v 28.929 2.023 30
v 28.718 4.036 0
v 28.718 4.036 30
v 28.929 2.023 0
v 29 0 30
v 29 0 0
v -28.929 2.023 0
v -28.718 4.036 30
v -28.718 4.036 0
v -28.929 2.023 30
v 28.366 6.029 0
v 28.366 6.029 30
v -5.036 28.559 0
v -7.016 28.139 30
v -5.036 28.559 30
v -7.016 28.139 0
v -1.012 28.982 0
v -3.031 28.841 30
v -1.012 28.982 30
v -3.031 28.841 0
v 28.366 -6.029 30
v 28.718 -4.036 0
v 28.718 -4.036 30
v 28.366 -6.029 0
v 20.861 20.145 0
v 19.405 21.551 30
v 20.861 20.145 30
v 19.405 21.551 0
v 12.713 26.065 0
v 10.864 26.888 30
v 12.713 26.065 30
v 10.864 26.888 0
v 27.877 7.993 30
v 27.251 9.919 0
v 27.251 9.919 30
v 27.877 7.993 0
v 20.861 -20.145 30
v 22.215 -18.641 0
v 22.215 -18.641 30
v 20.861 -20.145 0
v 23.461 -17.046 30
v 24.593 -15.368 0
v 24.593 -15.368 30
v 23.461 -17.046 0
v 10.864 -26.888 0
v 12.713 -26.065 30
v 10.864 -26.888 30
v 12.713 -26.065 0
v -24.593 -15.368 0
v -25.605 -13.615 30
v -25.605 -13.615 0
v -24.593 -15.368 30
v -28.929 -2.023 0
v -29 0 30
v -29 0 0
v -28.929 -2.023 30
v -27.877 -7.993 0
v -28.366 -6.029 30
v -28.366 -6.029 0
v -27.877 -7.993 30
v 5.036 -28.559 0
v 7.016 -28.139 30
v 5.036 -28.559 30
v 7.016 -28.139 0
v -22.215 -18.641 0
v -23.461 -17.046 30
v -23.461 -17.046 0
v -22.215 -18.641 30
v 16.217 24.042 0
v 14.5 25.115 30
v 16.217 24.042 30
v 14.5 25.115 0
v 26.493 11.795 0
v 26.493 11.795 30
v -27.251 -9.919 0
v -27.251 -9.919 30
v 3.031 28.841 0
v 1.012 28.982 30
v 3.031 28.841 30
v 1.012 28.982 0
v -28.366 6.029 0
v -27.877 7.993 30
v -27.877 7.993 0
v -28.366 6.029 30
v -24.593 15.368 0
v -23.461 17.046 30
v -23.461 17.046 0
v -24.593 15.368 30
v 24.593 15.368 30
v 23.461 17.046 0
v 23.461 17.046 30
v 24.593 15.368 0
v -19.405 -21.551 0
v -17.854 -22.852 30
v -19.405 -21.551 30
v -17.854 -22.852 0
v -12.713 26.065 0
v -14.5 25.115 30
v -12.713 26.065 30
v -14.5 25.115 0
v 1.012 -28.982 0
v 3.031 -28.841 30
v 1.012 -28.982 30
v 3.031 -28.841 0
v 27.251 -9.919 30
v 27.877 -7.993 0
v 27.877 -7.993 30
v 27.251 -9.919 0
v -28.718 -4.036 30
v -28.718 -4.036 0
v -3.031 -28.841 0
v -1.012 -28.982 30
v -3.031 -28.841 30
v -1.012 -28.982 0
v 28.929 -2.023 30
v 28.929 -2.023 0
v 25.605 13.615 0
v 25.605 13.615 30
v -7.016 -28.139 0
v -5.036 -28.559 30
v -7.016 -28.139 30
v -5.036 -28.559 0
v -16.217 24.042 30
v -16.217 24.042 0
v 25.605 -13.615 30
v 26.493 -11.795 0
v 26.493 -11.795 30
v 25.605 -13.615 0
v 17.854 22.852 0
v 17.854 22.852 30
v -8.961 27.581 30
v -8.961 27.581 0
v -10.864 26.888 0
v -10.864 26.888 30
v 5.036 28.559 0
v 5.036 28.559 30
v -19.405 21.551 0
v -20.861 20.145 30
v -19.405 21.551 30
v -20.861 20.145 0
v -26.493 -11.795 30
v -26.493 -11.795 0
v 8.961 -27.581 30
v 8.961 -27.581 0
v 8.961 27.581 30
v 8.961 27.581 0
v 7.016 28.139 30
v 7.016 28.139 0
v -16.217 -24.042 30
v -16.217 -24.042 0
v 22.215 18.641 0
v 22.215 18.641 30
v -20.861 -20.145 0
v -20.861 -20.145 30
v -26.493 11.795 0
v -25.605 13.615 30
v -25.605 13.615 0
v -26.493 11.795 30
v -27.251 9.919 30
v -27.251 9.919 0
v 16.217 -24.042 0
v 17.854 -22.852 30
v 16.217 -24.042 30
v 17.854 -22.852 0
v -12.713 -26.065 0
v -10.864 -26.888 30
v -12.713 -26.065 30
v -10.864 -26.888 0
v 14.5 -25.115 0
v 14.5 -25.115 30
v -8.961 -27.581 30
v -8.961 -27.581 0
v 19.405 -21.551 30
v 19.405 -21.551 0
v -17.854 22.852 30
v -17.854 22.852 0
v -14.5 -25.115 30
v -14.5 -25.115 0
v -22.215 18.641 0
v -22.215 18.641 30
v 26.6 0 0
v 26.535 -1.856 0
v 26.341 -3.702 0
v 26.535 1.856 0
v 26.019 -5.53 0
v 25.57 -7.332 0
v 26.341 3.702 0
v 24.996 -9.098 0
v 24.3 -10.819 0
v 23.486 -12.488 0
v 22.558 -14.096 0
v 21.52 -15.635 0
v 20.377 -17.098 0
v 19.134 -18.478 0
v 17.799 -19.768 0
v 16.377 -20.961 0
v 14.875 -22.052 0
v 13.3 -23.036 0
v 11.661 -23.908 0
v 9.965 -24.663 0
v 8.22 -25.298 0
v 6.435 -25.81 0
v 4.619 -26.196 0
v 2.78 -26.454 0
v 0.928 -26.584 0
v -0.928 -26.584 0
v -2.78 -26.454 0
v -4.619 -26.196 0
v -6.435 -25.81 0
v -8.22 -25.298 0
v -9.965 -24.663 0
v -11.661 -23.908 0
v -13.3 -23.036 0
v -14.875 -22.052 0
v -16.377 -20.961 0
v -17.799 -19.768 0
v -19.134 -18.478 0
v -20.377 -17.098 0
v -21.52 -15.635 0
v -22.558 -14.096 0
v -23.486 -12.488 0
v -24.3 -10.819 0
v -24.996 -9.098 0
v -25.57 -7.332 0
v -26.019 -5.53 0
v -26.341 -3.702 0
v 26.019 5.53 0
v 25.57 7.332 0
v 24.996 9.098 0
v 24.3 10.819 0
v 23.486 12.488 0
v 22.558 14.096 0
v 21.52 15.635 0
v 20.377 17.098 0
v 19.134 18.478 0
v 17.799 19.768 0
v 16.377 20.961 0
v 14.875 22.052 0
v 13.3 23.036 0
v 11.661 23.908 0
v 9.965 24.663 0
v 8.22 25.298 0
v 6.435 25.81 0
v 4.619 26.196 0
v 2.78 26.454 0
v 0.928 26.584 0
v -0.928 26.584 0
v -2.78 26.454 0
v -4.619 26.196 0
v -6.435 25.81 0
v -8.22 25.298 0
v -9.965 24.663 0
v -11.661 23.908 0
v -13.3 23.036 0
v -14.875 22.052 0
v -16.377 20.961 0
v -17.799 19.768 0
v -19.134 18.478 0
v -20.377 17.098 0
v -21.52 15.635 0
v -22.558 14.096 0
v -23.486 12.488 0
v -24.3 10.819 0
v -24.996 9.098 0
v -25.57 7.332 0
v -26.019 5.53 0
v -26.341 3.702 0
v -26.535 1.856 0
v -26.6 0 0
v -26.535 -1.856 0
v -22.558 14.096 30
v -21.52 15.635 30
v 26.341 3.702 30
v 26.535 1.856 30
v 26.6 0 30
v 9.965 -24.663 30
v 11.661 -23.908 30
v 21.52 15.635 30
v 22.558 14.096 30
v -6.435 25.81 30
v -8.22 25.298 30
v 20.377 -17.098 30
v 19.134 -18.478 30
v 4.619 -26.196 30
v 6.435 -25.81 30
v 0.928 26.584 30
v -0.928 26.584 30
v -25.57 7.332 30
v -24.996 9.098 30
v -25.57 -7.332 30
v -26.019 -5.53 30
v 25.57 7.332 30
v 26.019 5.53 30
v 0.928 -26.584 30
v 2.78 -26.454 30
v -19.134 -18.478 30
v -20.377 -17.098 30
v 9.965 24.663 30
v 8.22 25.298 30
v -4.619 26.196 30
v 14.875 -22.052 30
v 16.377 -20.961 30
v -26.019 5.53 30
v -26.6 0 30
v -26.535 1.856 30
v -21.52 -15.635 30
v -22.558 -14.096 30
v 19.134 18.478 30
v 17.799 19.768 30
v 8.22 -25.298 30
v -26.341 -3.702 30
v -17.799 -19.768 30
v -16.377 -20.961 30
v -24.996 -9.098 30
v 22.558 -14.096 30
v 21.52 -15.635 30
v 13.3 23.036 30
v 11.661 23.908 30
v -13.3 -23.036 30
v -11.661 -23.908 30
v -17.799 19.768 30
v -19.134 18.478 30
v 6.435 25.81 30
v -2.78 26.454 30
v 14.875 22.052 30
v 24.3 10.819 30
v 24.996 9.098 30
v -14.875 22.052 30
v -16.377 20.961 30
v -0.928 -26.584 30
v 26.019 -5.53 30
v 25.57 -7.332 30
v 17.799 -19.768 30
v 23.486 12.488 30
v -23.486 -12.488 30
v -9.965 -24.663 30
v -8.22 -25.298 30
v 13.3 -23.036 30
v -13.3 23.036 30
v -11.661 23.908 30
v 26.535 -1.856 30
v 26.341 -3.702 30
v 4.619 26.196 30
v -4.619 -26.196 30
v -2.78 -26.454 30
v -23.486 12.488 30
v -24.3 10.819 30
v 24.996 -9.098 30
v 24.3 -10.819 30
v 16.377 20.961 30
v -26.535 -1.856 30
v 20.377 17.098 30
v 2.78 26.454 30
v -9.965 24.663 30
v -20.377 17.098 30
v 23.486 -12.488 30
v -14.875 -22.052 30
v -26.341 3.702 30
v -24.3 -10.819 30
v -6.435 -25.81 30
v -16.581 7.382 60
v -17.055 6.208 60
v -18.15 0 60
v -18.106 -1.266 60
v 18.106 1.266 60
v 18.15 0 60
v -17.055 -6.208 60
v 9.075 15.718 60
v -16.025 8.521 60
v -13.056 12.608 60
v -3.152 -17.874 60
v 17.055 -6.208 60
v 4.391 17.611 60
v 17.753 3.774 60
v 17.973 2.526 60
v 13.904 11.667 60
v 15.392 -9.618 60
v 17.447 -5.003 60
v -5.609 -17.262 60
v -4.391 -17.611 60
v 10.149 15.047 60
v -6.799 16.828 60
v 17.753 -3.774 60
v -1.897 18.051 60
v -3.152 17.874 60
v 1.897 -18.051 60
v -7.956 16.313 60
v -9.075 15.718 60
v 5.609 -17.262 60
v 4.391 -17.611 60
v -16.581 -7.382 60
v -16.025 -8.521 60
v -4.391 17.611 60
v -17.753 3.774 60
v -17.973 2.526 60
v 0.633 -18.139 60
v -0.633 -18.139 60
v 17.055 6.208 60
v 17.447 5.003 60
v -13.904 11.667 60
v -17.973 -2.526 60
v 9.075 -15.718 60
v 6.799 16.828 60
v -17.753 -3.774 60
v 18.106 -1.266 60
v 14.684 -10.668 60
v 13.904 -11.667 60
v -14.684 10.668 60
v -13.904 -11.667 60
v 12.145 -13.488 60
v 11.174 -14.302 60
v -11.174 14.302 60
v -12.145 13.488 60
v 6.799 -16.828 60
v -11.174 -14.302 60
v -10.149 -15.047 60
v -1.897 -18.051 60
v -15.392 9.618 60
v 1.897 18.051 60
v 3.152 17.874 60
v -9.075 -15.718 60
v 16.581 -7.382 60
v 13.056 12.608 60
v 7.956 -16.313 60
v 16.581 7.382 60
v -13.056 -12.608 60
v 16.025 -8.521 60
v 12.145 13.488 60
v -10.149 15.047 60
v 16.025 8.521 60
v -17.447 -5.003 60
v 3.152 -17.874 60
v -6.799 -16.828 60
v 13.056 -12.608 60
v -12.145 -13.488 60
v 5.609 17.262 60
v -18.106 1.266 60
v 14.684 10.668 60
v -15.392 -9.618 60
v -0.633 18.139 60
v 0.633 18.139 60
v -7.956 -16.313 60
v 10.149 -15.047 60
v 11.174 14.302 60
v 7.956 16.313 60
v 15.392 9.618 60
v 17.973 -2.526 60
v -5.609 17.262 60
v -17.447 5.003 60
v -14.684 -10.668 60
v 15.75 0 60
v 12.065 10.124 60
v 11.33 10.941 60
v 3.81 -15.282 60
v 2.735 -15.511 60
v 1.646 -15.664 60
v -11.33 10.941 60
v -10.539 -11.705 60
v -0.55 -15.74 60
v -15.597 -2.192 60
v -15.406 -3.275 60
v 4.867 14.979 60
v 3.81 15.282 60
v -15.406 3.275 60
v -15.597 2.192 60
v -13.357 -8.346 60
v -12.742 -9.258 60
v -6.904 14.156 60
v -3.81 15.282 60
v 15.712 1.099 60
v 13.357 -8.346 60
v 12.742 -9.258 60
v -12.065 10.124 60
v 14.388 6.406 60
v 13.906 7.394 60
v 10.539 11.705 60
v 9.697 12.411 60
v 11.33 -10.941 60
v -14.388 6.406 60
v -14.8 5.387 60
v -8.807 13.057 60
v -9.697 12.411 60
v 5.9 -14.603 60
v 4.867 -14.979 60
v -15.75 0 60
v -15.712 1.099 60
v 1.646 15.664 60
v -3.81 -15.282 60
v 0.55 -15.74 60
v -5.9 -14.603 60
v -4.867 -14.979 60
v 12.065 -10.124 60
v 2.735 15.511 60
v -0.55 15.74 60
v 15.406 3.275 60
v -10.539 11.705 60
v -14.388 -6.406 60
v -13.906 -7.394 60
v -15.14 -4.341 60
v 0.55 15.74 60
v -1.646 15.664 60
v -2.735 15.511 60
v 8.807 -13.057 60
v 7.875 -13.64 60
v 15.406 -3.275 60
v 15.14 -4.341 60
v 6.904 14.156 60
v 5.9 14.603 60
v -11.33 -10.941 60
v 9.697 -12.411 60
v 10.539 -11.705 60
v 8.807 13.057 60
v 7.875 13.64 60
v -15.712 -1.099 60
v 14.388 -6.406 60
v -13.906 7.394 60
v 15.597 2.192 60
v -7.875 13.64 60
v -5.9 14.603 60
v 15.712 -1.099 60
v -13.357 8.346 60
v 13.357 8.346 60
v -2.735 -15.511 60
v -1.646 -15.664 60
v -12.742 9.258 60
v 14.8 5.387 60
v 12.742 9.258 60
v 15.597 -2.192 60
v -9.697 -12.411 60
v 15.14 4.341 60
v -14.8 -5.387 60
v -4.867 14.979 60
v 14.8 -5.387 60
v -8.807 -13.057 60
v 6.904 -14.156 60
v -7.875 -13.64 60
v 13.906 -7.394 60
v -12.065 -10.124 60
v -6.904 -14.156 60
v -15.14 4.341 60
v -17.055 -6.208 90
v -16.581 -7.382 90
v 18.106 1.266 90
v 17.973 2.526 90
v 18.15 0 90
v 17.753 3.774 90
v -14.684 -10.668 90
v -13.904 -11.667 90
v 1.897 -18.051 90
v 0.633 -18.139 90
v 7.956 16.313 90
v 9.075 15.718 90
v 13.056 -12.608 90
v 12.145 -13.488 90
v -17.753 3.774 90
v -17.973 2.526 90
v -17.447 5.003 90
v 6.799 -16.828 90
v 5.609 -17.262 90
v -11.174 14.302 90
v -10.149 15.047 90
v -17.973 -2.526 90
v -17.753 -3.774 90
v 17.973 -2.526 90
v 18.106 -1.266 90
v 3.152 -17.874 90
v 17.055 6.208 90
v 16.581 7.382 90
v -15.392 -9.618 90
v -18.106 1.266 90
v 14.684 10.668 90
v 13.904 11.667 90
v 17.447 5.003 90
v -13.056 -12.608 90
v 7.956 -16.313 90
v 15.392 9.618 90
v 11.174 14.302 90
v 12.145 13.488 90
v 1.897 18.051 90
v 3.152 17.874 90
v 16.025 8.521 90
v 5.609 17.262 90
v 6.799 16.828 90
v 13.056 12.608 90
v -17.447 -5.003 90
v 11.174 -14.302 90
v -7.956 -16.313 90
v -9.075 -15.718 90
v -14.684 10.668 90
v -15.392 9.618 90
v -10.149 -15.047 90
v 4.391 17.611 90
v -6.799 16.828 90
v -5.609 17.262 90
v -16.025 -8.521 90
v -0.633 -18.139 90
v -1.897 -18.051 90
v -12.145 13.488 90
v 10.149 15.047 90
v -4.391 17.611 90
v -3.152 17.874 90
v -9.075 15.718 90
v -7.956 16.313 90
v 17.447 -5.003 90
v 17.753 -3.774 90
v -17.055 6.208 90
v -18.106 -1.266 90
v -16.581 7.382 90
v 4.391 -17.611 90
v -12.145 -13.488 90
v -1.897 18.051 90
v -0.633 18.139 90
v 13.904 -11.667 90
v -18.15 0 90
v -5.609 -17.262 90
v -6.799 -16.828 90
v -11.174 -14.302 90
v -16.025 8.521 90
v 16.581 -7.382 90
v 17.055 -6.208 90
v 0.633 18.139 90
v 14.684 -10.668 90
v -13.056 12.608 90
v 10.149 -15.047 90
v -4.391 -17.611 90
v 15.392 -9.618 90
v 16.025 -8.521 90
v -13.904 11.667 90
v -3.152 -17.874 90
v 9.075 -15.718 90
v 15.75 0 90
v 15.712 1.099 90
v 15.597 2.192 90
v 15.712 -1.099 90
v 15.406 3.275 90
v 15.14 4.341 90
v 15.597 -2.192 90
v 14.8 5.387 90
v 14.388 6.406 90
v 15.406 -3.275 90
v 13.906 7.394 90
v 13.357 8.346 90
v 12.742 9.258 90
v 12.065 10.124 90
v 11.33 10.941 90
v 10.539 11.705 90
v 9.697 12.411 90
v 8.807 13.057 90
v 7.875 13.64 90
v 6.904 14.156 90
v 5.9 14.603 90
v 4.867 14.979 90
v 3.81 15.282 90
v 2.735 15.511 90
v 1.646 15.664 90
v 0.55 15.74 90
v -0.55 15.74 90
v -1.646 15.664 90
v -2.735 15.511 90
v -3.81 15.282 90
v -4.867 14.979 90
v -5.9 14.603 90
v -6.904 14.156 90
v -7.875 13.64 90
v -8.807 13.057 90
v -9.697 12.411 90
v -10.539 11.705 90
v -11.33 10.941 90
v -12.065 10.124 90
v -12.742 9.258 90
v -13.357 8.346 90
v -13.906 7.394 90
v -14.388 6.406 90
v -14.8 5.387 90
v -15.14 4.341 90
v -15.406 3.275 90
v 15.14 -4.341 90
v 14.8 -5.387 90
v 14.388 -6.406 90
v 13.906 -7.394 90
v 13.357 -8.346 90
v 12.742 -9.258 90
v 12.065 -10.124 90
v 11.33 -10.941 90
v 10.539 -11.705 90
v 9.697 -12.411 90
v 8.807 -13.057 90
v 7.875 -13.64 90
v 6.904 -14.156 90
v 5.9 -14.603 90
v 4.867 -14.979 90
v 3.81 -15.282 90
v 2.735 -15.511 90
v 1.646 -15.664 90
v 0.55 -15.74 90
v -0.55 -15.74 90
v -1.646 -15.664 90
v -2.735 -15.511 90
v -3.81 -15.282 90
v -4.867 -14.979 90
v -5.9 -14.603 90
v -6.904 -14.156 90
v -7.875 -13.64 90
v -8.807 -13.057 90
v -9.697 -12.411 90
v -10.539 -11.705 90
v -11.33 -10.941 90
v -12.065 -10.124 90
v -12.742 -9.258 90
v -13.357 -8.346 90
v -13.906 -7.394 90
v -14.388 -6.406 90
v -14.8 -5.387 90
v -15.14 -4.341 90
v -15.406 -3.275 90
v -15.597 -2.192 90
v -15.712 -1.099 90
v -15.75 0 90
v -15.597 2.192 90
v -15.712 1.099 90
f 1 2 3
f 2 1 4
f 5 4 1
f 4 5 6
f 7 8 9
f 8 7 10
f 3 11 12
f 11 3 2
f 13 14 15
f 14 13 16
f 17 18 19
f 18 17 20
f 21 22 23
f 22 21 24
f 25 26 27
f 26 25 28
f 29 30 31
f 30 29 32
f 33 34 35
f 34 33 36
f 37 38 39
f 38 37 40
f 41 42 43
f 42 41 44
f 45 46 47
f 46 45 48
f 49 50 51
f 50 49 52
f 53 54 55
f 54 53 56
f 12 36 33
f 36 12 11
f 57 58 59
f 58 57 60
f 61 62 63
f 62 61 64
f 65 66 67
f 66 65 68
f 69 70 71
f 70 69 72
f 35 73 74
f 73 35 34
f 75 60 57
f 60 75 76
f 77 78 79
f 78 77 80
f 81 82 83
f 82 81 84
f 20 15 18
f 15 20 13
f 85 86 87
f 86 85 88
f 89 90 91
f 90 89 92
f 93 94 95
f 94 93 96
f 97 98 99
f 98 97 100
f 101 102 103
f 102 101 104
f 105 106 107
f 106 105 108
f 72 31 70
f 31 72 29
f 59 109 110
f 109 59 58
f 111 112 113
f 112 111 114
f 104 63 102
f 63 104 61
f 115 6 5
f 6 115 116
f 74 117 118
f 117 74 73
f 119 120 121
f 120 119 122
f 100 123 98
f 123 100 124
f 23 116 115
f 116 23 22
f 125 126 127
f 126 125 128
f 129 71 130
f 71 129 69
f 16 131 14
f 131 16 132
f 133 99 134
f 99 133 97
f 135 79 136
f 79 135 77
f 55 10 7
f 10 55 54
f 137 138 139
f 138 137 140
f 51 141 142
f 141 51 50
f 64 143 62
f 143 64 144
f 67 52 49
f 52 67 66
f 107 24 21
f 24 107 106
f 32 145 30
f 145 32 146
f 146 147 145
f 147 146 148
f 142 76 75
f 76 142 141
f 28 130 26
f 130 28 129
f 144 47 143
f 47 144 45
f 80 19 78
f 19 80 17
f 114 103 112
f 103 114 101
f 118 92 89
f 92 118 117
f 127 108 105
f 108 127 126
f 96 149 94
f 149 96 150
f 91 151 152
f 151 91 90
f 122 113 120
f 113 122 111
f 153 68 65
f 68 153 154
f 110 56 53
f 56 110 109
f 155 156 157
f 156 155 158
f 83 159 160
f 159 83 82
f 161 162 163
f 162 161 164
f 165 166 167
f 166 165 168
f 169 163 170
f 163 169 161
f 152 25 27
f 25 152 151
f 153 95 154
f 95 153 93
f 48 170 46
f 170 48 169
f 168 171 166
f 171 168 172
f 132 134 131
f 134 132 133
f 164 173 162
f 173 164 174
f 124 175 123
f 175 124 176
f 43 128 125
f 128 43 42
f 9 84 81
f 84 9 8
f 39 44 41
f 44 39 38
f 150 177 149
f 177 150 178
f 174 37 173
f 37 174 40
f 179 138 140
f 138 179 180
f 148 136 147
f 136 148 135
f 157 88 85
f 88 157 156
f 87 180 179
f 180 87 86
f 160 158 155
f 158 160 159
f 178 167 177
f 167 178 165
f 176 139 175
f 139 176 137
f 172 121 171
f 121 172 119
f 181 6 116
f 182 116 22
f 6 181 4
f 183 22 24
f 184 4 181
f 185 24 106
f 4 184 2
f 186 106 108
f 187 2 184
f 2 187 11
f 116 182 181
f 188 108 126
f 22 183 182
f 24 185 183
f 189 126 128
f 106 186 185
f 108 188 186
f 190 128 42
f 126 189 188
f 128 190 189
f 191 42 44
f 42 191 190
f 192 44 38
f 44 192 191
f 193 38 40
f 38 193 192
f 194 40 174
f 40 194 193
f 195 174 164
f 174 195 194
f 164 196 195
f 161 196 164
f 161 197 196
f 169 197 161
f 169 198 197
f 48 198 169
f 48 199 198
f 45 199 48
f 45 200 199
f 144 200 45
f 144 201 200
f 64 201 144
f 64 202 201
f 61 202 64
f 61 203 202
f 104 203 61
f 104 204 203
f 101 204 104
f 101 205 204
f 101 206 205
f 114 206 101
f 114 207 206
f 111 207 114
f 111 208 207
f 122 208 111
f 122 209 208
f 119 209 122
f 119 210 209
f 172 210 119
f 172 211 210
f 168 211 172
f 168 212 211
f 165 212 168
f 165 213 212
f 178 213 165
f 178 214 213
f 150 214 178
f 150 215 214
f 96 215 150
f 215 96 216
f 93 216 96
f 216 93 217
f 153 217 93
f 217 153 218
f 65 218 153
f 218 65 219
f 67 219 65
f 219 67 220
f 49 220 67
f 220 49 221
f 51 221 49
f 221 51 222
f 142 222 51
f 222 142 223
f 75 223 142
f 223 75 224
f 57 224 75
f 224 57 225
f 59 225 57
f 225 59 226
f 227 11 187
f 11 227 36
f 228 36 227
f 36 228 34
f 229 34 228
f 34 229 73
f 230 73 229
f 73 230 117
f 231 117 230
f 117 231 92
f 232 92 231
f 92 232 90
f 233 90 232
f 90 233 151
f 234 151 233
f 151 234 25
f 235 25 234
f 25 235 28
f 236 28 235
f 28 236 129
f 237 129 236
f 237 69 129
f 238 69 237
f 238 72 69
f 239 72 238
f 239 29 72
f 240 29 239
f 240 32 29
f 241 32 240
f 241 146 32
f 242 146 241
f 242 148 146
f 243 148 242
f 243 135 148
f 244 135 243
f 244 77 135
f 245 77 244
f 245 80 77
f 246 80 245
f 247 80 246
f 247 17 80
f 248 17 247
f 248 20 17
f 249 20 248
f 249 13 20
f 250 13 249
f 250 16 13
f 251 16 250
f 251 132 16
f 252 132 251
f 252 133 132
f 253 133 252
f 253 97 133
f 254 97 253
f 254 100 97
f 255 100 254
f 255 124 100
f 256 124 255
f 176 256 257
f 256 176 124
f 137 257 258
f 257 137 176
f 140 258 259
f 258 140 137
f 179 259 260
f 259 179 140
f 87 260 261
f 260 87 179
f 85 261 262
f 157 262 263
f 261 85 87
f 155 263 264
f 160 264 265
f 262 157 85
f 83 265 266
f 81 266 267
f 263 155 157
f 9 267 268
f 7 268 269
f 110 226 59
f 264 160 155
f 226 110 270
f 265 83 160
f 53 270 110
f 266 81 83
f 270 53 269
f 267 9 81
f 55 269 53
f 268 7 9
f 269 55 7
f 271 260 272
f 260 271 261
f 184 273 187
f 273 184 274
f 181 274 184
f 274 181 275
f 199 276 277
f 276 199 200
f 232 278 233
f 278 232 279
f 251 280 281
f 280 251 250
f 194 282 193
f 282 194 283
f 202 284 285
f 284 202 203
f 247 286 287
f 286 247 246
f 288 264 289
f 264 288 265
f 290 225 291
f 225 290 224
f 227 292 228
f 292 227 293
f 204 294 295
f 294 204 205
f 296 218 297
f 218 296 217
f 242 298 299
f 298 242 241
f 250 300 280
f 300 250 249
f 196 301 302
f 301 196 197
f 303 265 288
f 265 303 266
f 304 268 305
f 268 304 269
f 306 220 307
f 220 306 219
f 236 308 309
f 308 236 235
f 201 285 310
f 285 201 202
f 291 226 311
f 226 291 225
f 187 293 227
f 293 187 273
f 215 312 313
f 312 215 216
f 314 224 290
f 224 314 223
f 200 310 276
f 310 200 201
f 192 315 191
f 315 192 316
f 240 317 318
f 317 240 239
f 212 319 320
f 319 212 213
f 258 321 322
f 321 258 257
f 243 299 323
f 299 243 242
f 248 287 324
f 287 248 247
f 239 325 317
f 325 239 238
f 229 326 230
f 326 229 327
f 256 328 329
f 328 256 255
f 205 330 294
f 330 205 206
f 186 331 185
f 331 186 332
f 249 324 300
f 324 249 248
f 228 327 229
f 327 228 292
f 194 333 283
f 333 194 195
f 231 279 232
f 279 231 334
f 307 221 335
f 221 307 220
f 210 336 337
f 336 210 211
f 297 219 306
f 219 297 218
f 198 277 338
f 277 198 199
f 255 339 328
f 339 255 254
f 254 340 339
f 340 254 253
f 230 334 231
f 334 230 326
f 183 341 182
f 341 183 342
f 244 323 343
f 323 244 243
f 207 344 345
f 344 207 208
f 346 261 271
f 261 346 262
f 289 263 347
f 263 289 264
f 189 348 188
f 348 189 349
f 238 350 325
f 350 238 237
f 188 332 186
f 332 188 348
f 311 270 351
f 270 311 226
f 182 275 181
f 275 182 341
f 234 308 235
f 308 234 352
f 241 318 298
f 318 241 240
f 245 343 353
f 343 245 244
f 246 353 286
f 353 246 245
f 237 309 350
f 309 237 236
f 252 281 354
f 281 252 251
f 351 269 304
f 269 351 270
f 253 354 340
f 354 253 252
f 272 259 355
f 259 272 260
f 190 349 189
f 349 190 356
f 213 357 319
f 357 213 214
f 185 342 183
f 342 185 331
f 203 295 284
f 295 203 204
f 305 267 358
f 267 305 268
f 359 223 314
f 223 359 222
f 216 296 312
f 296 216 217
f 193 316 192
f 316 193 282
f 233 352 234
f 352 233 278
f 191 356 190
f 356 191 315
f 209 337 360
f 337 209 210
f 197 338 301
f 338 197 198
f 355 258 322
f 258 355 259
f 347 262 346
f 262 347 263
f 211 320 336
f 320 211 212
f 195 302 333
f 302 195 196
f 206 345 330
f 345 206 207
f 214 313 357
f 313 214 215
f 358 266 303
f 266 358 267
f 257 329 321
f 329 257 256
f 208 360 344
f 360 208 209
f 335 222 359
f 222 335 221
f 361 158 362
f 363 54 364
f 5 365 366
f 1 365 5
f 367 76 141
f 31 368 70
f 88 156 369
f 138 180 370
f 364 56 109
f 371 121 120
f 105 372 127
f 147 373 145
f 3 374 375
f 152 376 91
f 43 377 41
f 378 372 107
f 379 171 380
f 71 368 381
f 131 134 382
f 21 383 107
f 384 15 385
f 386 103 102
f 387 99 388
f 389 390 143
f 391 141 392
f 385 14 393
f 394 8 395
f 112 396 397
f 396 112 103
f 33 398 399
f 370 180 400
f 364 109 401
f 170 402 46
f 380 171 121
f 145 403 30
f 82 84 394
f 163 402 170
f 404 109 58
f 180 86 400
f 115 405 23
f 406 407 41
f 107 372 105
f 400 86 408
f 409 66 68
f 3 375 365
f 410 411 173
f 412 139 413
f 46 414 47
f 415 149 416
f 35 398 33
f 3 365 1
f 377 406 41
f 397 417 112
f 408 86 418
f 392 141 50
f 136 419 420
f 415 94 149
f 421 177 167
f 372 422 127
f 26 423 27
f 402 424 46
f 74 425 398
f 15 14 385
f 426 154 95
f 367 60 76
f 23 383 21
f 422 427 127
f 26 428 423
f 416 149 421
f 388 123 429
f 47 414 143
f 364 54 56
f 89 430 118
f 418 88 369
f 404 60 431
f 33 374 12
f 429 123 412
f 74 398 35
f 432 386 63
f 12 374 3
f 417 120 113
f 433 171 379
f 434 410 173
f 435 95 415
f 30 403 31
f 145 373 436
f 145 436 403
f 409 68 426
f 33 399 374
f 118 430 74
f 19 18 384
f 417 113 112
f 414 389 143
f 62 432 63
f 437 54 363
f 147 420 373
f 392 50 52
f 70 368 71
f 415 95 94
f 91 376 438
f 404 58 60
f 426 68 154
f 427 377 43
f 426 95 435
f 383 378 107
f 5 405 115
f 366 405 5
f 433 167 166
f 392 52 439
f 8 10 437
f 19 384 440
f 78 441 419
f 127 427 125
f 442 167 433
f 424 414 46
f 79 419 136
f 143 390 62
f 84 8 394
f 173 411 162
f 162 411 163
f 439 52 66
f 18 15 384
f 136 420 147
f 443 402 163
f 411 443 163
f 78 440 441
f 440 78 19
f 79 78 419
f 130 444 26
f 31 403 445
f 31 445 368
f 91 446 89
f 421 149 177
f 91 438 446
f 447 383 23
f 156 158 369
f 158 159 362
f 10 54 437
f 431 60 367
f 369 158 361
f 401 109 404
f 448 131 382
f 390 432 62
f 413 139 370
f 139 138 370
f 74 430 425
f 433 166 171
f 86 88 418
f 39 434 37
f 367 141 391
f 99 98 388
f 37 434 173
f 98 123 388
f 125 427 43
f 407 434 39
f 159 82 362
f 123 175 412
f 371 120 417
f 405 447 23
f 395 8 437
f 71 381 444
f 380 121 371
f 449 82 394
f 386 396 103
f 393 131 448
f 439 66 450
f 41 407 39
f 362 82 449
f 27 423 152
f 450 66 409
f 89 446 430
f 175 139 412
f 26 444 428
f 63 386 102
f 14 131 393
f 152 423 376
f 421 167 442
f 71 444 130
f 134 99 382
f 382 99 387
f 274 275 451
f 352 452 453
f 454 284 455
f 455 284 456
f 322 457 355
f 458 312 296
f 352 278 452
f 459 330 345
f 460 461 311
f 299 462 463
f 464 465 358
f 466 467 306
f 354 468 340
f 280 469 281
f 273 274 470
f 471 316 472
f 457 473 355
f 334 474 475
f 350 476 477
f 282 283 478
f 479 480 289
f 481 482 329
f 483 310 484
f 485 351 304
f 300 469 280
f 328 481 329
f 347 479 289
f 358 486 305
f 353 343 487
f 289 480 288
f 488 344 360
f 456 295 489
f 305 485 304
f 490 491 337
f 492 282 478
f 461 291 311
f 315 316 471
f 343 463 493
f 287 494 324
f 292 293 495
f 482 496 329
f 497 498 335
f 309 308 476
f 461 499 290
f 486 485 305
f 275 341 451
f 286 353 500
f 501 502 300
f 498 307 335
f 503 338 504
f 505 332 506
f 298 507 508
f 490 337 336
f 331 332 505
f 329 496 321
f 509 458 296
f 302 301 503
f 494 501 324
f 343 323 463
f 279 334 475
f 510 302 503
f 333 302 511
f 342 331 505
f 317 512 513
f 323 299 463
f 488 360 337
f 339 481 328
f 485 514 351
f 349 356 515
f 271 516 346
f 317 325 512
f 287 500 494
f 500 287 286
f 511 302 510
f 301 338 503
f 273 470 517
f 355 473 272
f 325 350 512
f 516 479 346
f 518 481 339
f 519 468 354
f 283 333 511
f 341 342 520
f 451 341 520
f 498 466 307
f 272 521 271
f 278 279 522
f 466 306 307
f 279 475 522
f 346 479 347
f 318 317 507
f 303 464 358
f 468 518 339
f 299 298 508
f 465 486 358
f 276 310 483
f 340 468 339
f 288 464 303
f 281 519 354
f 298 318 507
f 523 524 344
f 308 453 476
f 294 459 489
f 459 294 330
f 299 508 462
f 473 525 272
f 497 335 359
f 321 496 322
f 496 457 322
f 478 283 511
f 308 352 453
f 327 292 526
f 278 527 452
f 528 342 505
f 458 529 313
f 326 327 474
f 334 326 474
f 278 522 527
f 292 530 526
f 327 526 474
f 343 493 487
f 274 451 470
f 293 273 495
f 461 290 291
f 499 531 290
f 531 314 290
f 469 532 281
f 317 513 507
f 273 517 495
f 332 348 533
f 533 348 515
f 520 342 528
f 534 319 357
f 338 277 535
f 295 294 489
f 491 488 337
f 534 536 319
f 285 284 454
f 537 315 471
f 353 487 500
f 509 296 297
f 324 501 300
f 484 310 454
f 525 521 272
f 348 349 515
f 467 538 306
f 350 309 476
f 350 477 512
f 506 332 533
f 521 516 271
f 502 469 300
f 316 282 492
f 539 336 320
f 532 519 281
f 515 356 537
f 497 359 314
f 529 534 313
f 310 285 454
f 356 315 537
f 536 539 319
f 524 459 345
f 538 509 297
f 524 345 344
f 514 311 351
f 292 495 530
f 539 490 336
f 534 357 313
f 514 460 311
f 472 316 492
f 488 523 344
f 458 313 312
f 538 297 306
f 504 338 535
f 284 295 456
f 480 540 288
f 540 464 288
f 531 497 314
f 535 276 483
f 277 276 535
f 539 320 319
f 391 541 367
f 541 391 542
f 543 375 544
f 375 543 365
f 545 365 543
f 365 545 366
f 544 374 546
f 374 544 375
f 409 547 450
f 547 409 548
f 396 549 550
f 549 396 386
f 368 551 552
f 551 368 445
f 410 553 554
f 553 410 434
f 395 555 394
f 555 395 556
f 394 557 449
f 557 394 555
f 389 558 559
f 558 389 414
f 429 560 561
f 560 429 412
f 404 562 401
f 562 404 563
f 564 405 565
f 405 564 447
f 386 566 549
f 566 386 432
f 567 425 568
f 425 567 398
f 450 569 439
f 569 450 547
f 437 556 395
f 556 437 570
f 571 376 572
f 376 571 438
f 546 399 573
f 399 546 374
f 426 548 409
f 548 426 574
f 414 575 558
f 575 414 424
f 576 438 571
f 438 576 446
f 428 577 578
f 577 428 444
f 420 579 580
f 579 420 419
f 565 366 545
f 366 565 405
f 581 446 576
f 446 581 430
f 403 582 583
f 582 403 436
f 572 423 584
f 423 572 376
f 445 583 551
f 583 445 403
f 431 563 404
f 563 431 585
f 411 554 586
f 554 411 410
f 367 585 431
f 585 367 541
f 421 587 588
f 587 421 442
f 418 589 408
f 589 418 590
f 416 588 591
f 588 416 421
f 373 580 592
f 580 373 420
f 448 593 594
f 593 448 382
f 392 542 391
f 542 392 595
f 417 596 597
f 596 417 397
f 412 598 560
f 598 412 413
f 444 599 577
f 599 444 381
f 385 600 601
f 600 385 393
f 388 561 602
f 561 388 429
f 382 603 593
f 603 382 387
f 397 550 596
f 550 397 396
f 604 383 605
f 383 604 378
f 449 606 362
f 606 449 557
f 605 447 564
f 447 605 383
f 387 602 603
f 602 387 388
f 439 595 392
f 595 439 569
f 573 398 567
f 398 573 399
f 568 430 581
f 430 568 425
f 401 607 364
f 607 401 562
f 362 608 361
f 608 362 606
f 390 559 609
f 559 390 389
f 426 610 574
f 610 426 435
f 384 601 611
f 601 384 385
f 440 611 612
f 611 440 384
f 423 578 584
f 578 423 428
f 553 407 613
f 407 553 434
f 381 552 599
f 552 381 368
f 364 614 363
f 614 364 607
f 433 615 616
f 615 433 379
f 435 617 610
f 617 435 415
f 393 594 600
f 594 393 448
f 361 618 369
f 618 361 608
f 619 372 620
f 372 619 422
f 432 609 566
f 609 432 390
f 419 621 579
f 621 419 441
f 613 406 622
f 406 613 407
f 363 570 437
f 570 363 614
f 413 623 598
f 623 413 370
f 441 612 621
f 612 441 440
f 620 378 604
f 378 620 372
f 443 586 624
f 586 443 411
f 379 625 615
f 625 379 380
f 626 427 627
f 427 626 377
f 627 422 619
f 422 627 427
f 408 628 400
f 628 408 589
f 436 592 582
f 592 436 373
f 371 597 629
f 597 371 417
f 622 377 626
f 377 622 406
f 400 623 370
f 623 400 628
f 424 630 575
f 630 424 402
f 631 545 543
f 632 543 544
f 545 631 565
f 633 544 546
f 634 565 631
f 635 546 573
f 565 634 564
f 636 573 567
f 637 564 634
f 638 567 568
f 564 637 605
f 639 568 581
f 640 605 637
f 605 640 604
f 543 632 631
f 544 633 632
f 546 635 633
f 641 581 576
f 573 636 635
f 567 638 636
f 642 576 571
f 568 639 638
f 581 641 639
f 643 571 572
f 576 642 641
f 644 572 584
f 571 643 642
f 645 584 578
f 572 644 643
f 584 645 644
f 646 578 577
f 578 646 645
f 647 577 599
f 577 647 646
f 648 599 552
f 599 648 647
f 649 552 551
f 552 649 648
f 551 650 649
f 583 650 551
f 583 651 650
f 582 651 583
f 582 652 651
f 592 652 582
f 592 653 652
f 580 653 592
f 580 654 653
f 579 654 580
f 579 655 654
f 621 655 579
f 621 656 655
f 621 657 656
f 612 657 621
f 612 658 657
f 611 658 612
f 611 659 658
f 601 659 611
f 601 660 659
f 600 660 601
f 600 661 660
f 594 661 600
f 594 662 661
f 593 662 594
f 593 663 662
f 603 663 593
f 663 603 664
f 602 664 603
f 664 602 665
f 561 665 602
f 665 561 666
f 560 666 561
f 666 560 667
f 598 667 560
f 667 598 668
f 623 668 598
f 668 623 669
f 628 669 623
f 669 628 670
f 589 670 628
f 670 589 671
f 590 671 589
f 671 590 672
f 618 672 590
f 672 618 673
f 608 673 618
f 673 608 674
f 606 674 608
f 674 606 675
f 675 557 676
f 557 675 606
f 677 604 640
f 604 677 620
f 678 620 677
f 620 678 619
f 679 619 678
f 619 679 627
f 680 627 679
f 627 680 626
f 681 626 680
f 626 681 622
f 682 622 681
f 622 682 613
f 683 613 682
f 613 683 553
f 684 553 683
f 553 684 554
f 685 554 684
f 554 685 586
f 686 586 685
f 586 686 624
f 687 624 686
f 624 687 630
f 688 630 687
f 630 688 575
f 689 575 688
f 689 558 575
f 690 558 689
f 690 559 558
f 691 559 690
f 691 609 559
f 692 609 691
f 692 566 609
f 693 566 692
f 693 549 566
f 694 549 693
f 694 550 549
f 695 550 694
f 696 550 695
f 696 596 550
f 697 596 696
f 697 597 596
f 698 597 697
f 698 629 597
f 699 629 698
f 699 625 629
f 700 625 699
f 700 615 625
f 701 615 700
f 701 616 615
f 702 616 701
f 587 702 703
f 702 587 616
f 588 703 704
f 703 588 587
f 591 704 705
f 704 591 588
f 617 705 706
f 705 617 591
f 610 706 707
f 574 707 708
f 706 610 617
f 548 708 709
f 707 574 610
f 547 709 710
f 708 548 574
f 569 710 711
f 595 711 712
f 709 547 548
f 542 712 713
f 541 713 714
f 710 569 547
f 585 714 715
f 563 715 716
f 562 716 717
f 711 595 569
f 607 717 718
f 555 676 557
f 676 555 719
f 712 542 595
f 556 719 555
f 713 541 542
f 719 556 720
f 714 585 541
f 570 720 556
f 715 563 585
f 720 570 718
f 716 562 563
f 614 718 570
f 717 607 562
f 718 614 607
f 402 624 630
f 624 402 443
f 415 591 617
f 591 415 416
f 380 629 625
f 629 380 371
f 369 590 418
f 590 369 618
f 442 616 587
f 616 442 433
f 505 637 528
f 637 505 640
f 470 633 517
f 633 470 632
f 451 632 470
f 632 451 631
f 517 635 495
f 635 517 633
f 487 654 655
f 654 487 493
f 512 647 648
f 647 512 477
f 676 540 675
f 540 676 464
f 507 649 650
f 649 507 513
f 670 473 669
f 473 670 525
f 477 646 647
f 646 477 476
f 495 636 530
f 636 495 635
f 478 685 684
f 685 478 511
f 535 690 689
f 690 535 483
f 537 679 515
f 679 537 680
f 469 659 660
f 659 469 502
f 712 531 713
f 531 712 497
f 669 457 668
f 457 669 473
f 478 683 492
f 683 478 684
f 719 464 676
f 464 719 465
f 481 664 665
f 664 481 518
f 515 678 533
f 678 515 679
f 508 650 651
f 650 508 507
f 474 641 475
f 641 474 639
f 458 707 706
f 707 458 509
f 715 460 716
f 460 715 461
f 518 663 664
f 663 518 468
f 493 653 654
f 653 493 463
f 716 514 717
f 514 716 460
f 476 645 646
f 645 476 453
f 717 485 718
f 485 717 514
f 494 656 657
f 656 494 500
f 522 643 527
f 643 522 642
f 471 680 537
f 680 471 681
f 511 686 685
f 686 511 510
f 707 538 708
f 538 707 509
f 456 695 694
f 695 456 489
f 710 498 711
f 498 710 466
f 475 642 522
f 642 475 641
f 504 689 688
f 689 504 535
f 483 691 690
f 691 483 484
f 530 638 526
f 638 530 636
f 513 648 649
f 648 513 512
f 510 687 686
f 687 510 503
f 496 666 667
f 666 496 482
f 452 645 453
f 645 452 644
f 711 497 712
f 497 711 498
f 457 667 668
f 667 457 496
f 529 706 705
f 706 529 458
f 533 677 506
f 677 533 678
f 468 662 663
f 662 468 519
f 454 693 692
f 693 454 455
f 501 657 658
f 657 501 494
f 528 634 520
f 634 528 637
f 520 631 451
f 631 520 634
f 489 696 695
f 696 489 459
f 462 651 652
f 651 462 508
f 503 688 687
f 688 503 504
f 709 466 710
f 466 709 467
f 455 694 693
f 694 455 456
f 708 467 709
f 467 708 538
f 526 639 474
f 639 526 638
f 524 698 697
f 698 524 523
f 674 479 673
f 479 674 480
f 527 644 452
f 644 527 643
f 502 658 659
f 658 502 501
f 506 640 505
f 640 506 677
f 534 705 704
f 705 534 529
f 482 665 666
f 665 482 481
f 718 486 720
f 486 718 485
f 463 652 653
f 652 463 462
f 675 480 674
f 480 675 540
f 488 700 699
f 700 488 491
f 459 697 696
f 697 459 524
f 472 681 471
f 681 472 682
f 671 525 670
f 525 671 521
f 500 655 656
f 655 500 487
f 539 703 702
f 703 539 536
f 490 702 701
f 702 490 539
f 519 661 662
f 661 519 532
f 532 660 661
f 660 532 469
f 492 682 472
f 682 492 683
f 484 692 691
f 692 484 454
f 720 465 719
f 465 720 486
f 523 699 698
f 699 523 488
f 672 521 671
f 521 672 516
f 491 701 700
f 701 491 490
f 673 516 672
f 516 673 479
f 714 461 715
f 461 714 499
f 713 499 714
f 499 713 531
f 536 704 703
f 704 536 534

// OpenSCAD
$fa=4; // default minimum facet angle is now 0.5
$fs=0.05; // default minimum facet size is now 0.05 mm

hose1ID = 58;
hose2OD = 31.5;
wallThickness = 1.2;

interfaceLength = 30;

difference() {
  cylinder(r = hose1ID / 2, interfaceLength);
  translate([0, 0, -.5]) cylinder(r = hose1ID / 2 - wallThickness * 2, h = interfaceLength + 1);
}

translate([0, 0, interfaceLength]) difference() {
  cylinder(r1 = hose1ID / 2, r2 = hose2OD / 2 + wallThickness * 2, h = interfaceLength);
  cylinder(r1 = hose1ID / 2 - wallThickness * 2, r2 = hose2OD / 2, h = interfaceLength);
}

translate([0, 0, interfaceLength * 2]) difference() {
  cylinder(r = hose2OD / 2 + wallThickness * 2, h = interfaceLength);
  translate([0, 0, -.5]) cylinder(r = hose2OD / 2, h = interfaceLength + 1);
}
